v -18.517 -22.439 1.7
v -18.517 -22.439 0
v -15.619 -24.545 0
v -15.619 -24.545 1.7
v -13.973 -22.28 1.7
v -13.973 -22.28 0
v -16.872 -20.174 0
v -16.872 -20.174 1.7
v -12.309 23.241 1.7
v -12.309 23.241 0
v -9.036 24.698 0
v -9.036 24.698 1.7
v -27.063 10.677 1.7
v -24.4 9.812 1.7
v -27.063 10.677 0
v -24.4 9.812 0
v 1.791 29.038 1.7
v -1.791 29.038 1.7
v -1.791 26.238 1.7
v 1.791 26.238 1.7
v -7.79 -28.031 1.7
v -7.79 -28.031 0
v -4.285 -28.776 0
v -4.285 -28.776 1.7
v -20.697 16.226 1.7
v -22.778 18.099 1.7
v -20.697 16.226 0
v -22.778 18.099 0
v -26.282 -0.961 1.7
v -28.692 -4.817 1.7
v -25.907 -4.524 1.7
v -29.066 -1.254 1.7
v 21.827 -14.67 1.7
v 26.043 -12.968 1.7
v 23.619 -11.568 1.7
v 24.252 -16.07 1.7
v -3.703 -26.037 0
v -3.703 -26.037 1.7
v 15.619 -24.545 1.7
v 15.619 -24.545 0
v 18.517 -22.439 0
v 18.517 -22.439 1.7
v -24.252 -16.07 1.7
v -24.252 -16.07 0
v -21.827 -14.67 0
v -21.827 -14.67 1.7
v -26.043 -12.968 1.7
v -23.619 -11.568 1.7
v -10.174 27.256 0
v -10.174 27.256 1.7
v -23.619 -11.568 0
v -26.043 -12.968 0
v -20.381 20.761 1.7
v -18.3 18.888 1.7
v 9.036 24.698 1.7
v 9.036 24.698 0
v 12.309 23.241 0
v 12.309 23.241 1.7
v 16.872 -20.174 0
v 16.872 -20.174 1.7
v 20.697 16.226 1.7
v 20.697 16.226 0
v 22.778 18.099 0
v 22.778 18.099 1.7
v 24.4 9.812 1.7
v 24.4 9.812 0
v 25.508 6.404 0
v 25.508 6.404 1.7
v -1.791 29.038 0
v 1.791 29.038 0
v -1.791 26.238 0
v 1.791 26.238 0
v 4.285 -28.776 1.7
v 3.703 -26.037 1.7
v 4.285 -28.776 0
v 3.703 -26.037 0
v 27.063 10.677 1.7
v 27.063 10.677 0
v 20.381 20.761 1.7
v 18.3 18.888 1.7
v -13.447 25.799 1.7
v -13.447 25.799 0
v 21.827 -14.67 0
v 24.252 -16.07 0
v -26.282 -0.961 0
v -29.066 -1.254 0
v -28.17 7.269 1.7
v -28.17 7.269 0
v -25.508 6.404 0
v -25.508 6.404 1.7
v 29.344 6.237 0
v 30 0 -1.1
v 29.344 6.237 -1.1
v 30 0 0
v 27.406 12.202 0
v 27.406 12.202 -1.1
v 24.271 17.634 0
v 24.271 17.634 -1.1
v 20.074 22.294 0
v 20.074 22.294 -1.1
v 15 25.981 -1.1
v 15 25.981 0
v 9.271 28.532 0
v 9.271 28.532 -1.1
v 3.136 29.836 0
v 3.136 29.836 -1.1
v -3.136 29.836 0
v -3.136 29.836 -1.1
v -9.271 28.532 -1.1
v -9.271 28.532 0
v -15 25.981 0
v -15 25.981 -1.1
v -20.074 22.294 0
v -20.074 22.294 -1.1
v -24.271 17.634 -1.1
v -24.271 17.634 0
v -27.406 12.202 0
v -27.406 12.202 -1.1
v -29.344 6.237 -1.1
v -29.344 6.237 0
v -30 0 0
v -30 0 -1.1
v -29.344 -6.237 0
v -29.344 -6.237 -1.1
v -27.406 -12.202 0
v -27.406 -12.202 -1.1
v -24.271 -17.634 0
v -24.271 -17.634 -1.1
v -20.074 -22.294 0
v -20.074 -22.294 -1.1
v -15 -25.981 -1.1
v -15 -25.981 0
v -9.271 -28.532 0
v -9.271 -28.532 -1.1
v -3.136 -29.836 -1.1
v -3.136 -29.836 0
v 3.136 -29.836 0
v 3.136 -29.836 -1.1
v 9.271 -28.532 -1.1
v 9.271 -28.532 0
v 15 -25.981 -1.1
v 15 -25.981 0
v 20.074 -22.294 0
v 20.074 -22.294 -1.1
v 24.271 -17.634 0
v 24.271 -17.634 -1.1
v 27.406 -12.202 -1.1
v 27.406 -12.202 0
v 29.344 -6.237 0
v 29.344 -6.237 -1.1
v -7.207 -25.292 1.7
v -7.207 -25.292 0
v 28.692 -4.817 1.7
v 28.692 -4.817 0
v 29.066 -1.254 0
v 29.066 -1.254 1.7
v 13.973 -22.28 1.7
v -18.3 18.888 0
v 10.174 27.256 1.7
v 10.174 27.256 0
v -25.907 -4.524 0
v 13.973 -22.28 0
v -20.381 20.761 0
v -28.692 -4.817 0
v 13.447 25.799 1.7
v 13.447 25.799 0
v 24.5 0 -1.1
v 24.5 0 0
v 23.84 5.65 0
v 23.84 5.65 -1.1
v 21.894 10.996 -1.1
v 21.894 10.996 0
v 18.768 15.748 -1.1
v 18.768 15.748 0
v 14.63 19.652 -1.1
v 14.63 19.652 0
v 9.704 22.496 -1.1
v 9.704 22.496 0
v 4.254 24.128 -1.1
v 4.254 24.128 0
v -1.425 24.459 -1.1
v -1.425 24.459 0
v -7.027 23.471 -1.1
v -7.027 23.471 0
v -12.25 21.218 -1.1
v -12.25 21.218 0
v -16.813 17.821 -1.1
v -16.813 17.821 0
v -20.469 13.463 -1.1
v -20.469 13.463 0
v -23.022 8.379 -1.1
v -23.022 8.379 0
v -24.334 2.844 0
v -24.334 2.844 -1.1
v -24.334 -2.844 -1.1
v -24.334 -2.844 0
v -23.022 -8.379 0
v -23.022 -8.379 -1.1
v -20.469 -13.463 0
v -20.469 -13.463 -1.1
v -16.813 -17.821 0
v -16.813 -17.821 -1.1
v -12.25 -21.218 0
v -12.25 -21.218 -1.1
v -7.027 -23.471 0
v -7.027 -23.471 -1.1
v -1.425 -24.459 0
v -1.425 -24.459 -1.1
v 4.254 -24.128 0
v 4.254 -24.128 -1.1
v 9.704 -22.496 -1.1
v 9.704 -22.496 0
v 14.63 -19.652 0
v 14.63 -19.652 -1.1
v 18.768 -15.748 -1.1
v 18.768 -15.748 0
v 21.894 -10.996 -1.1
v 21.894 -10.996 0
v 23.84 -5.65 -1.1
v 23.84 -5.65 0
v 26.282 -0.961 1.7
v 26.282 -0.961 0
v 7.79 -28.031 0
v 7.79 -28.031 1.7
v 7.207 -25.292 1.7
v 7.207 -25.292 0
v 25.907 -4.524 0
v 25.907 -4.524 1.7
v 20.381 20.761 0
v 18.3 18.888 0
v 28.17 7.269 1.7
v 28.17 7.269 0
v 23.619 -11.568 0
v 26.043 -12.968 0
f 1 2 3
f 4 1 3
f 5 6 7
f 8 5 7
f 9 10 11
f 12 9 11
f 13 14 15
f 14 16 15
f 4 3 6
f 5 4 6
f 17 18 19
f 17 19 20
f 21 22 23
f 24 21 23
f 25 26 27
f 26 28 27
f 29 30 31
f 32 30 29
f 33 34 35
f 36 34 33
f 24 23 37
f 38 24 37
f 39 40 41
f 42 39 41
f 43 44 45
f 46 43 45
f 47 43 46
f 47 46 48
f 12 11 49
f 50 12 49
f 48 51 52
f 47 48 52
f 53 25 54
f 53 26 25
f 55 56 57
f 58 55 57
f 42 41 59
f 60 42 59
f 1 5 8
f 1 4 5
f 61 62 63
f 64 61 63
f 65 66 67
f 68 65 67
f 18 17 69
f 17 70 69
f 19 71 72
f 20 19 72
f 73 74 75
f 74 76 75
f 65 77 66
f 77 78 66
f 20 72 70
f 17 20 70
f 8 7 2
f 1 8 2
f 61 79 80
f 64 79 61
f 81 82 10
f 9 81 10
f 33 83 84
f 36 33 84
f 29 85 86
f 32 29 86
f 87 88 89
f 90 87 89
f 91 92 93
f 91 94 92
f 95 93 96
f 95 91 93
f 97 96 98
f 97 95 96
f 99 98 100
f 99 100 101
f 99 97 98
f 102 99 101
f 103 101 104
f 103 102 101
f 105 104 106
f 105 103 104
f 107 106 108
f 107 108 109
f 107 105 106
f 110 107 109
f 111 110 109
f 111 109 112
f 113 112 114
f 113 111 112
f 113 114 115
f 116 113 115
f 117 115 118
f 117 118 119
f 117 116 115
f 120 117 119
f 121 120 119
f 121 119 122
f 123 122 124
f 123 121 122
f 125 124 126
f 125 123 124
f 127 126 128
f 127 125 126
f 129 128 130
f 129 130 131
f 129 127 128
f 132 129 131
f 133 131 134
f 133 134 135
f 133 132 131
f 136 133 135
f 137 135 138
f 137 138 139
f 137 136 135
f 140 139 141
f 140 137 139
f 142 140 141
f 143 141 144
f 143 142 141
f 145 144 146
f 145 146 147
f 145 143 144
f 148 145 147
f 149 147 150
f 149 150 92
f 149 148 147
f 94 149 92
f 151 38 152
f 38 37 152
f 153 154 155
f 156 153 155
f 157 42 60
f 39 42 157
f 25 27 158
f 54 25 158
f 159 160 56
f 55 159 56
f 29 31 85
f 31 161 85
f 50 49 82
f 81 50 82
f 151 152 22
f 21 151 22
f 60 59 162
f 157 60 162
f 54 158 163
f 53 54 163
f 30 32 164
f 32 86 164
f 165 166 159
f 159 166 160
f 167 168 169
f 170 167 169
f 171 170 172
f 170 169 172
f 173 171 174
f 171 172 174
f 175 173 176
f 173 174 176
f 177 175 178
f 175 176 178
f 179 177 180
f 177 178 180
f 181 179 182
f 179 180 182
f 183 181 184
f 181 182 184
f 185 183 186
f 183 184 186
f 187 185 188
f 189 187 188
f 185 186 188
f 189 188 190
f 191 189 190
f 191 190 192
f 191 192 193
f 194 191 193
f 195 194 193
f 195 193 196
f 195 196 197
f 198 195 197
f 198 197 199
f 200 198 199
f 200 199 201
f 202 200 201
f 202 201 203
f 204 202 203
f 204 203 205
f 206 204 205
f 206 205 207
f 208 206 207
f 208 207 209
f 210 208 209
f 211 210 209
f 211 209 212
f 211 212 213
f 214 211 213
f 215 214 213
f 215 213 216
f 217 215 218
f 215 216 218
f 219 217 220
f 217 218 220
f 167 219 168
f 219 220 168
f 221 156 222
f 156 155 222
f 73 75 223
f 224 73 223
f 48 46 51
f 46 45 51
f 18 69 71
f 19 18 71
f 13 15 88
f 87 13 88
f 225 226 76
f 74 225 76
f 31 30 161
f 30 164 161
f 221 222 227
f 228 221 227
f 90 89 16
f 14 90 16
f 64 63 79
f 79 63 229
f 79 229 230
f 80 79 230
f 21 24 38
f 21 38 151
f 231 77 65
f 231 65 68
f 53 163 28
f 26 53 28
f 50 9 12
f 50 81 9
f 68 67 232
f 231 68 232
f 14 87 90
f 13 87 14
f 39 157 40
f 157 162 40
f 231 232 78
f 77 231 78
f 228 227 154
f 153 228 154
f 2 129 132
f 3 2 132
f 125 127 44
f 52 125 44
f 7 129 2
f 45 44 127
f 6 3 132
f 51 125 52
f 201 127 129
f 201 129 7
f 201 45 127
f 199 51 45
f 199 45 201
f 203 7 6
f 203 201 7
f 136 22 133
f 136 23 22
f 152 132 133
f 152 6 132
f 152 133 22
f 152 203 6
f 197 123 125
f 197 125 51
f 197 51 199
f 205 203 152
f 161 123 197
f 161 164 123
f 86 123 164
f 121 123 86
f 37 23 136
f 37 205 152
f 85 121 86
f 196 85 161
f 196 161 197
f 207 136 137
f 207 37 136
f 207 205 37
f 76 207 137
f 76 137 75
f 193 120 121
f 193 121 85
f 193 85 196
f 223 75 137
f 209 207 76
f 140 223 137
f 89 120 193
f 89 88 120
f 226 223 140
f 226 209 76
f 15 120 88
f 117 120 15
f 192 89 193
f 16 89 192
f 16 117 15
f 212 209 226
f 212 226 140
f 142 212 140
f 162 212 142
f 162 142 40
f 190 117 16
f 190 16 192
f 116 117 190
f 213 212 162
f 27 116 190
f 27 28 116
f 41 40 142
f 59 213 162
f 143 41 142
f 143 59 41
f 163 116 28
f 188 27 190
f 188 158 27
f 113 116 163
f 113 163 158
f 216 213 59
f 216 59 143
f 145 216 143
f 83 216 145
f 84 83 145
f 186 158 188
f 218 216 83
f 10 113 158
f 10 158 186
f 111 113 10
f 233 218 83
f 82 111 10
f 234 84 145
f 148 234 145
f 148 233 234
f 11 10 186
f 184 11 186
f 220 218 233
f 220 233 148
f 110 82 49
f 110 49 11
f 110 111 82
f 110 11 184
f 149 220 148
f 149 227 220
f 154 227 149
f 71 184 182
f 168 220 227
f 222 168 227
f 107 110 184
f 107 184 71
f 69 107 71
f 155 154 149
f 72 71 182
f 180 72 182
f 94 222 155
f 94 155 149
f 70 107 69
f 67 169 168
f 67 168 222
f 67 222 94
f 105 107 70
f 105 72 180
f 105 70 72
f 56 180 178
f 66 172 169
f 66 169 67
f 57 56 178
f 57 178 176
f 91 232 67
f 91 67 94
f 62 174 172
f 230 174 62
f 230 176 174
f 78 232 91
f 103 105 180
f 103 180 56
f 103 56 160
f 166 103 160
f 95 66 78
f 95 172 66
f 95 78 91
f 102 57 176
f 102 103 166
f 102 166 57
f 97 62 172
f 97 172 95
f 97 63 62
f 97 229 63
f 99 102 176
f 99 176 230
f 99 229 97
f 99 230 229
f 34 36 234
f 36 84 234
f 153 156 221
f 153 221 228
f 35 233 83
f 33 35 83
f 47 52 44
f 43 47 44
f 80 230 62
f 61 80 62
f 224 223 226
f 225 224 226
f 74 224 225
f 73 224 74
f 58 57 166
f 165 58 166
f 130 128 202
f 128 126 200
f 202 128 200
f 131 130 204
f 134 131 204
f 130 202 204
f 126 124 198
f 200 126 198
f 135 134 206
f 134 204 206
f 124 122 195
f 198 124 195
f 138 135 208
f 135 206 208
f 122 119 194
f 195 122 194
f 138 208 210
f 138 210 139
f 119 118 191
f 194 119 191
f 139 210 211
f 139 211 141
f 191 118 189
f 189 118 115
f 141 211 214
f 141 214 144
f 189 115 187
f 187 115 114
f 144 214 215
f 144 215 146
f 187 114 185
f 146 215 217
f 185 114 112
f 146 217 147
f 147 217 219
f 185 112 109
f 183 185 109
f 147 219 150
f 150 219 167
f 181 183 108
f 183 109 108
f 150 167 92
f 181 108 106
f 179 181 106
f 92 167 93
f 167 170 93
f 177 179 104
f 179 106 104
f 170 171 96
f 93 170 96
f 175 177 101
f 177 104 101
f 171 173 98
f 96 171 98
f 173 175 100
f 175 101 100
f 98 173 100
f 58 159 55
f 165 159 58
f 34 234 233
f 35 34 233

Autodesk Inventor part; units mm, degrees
ref_plane "YZ Plane" through (0, 0, 0) normal (1, 0, 0) x (0, 1, 0)
ref_plane "XZ Plane" through (0, 0, 0) normal (0, 1, 0) x (-1, 0, 0)
ref_plane "XY Plane" through (0, 0, 0) normal (0, 0, 1) x (1, 0, 0)
sketch "Sketch1" plane through (0, 0, 0) normal (0, 0, 1) x (1, 0, 0)
  circle A0 centre (0, 0) radius 30
  circle A1 centre (0, 0) radius 24.5
  dimension "d0" = 49
  dimension "d1" = 60
extrude "Extrusion1" add sketch "Sketch1" against normal blind 1.1
sketch "Sketch2" plane through (0, 0, 0) normal (0, 0, 1) x (1, 0, 0)
  line L0 (0, 0) -> (0, 30) construction
  circle A0 centre (0, 0) radius 30 construction
  line L1 (-1.7914, 26.2382) -> (1.7914, 26.2382)
  line L2 (1.7914, 26.2382) -> (1.7914, 29.0379)
  line L3 (1.7914, 29.0379) -> (-1.7914, 29.0379)
  line L4 (-1.7914, 29.0379) -> (-1.7914, 26.2382)
  line L5 (-1.7914, 26.2382) -> (1.7914, 29.0379) construction
  line L6 (1.7914, 26.2382) -> (-1.7914, 29.0379) construction
  point P0 (0, 27.6381)
extrude "Extrusion2" add sketch "Sketch2" along normal blind 1.7
pattern_circular "Circular Pattern1" count 15 over 360 about axis through (0, 0, -10) along (0, 0, 1) of "Extrusion2"
properties part number "LightRing"
